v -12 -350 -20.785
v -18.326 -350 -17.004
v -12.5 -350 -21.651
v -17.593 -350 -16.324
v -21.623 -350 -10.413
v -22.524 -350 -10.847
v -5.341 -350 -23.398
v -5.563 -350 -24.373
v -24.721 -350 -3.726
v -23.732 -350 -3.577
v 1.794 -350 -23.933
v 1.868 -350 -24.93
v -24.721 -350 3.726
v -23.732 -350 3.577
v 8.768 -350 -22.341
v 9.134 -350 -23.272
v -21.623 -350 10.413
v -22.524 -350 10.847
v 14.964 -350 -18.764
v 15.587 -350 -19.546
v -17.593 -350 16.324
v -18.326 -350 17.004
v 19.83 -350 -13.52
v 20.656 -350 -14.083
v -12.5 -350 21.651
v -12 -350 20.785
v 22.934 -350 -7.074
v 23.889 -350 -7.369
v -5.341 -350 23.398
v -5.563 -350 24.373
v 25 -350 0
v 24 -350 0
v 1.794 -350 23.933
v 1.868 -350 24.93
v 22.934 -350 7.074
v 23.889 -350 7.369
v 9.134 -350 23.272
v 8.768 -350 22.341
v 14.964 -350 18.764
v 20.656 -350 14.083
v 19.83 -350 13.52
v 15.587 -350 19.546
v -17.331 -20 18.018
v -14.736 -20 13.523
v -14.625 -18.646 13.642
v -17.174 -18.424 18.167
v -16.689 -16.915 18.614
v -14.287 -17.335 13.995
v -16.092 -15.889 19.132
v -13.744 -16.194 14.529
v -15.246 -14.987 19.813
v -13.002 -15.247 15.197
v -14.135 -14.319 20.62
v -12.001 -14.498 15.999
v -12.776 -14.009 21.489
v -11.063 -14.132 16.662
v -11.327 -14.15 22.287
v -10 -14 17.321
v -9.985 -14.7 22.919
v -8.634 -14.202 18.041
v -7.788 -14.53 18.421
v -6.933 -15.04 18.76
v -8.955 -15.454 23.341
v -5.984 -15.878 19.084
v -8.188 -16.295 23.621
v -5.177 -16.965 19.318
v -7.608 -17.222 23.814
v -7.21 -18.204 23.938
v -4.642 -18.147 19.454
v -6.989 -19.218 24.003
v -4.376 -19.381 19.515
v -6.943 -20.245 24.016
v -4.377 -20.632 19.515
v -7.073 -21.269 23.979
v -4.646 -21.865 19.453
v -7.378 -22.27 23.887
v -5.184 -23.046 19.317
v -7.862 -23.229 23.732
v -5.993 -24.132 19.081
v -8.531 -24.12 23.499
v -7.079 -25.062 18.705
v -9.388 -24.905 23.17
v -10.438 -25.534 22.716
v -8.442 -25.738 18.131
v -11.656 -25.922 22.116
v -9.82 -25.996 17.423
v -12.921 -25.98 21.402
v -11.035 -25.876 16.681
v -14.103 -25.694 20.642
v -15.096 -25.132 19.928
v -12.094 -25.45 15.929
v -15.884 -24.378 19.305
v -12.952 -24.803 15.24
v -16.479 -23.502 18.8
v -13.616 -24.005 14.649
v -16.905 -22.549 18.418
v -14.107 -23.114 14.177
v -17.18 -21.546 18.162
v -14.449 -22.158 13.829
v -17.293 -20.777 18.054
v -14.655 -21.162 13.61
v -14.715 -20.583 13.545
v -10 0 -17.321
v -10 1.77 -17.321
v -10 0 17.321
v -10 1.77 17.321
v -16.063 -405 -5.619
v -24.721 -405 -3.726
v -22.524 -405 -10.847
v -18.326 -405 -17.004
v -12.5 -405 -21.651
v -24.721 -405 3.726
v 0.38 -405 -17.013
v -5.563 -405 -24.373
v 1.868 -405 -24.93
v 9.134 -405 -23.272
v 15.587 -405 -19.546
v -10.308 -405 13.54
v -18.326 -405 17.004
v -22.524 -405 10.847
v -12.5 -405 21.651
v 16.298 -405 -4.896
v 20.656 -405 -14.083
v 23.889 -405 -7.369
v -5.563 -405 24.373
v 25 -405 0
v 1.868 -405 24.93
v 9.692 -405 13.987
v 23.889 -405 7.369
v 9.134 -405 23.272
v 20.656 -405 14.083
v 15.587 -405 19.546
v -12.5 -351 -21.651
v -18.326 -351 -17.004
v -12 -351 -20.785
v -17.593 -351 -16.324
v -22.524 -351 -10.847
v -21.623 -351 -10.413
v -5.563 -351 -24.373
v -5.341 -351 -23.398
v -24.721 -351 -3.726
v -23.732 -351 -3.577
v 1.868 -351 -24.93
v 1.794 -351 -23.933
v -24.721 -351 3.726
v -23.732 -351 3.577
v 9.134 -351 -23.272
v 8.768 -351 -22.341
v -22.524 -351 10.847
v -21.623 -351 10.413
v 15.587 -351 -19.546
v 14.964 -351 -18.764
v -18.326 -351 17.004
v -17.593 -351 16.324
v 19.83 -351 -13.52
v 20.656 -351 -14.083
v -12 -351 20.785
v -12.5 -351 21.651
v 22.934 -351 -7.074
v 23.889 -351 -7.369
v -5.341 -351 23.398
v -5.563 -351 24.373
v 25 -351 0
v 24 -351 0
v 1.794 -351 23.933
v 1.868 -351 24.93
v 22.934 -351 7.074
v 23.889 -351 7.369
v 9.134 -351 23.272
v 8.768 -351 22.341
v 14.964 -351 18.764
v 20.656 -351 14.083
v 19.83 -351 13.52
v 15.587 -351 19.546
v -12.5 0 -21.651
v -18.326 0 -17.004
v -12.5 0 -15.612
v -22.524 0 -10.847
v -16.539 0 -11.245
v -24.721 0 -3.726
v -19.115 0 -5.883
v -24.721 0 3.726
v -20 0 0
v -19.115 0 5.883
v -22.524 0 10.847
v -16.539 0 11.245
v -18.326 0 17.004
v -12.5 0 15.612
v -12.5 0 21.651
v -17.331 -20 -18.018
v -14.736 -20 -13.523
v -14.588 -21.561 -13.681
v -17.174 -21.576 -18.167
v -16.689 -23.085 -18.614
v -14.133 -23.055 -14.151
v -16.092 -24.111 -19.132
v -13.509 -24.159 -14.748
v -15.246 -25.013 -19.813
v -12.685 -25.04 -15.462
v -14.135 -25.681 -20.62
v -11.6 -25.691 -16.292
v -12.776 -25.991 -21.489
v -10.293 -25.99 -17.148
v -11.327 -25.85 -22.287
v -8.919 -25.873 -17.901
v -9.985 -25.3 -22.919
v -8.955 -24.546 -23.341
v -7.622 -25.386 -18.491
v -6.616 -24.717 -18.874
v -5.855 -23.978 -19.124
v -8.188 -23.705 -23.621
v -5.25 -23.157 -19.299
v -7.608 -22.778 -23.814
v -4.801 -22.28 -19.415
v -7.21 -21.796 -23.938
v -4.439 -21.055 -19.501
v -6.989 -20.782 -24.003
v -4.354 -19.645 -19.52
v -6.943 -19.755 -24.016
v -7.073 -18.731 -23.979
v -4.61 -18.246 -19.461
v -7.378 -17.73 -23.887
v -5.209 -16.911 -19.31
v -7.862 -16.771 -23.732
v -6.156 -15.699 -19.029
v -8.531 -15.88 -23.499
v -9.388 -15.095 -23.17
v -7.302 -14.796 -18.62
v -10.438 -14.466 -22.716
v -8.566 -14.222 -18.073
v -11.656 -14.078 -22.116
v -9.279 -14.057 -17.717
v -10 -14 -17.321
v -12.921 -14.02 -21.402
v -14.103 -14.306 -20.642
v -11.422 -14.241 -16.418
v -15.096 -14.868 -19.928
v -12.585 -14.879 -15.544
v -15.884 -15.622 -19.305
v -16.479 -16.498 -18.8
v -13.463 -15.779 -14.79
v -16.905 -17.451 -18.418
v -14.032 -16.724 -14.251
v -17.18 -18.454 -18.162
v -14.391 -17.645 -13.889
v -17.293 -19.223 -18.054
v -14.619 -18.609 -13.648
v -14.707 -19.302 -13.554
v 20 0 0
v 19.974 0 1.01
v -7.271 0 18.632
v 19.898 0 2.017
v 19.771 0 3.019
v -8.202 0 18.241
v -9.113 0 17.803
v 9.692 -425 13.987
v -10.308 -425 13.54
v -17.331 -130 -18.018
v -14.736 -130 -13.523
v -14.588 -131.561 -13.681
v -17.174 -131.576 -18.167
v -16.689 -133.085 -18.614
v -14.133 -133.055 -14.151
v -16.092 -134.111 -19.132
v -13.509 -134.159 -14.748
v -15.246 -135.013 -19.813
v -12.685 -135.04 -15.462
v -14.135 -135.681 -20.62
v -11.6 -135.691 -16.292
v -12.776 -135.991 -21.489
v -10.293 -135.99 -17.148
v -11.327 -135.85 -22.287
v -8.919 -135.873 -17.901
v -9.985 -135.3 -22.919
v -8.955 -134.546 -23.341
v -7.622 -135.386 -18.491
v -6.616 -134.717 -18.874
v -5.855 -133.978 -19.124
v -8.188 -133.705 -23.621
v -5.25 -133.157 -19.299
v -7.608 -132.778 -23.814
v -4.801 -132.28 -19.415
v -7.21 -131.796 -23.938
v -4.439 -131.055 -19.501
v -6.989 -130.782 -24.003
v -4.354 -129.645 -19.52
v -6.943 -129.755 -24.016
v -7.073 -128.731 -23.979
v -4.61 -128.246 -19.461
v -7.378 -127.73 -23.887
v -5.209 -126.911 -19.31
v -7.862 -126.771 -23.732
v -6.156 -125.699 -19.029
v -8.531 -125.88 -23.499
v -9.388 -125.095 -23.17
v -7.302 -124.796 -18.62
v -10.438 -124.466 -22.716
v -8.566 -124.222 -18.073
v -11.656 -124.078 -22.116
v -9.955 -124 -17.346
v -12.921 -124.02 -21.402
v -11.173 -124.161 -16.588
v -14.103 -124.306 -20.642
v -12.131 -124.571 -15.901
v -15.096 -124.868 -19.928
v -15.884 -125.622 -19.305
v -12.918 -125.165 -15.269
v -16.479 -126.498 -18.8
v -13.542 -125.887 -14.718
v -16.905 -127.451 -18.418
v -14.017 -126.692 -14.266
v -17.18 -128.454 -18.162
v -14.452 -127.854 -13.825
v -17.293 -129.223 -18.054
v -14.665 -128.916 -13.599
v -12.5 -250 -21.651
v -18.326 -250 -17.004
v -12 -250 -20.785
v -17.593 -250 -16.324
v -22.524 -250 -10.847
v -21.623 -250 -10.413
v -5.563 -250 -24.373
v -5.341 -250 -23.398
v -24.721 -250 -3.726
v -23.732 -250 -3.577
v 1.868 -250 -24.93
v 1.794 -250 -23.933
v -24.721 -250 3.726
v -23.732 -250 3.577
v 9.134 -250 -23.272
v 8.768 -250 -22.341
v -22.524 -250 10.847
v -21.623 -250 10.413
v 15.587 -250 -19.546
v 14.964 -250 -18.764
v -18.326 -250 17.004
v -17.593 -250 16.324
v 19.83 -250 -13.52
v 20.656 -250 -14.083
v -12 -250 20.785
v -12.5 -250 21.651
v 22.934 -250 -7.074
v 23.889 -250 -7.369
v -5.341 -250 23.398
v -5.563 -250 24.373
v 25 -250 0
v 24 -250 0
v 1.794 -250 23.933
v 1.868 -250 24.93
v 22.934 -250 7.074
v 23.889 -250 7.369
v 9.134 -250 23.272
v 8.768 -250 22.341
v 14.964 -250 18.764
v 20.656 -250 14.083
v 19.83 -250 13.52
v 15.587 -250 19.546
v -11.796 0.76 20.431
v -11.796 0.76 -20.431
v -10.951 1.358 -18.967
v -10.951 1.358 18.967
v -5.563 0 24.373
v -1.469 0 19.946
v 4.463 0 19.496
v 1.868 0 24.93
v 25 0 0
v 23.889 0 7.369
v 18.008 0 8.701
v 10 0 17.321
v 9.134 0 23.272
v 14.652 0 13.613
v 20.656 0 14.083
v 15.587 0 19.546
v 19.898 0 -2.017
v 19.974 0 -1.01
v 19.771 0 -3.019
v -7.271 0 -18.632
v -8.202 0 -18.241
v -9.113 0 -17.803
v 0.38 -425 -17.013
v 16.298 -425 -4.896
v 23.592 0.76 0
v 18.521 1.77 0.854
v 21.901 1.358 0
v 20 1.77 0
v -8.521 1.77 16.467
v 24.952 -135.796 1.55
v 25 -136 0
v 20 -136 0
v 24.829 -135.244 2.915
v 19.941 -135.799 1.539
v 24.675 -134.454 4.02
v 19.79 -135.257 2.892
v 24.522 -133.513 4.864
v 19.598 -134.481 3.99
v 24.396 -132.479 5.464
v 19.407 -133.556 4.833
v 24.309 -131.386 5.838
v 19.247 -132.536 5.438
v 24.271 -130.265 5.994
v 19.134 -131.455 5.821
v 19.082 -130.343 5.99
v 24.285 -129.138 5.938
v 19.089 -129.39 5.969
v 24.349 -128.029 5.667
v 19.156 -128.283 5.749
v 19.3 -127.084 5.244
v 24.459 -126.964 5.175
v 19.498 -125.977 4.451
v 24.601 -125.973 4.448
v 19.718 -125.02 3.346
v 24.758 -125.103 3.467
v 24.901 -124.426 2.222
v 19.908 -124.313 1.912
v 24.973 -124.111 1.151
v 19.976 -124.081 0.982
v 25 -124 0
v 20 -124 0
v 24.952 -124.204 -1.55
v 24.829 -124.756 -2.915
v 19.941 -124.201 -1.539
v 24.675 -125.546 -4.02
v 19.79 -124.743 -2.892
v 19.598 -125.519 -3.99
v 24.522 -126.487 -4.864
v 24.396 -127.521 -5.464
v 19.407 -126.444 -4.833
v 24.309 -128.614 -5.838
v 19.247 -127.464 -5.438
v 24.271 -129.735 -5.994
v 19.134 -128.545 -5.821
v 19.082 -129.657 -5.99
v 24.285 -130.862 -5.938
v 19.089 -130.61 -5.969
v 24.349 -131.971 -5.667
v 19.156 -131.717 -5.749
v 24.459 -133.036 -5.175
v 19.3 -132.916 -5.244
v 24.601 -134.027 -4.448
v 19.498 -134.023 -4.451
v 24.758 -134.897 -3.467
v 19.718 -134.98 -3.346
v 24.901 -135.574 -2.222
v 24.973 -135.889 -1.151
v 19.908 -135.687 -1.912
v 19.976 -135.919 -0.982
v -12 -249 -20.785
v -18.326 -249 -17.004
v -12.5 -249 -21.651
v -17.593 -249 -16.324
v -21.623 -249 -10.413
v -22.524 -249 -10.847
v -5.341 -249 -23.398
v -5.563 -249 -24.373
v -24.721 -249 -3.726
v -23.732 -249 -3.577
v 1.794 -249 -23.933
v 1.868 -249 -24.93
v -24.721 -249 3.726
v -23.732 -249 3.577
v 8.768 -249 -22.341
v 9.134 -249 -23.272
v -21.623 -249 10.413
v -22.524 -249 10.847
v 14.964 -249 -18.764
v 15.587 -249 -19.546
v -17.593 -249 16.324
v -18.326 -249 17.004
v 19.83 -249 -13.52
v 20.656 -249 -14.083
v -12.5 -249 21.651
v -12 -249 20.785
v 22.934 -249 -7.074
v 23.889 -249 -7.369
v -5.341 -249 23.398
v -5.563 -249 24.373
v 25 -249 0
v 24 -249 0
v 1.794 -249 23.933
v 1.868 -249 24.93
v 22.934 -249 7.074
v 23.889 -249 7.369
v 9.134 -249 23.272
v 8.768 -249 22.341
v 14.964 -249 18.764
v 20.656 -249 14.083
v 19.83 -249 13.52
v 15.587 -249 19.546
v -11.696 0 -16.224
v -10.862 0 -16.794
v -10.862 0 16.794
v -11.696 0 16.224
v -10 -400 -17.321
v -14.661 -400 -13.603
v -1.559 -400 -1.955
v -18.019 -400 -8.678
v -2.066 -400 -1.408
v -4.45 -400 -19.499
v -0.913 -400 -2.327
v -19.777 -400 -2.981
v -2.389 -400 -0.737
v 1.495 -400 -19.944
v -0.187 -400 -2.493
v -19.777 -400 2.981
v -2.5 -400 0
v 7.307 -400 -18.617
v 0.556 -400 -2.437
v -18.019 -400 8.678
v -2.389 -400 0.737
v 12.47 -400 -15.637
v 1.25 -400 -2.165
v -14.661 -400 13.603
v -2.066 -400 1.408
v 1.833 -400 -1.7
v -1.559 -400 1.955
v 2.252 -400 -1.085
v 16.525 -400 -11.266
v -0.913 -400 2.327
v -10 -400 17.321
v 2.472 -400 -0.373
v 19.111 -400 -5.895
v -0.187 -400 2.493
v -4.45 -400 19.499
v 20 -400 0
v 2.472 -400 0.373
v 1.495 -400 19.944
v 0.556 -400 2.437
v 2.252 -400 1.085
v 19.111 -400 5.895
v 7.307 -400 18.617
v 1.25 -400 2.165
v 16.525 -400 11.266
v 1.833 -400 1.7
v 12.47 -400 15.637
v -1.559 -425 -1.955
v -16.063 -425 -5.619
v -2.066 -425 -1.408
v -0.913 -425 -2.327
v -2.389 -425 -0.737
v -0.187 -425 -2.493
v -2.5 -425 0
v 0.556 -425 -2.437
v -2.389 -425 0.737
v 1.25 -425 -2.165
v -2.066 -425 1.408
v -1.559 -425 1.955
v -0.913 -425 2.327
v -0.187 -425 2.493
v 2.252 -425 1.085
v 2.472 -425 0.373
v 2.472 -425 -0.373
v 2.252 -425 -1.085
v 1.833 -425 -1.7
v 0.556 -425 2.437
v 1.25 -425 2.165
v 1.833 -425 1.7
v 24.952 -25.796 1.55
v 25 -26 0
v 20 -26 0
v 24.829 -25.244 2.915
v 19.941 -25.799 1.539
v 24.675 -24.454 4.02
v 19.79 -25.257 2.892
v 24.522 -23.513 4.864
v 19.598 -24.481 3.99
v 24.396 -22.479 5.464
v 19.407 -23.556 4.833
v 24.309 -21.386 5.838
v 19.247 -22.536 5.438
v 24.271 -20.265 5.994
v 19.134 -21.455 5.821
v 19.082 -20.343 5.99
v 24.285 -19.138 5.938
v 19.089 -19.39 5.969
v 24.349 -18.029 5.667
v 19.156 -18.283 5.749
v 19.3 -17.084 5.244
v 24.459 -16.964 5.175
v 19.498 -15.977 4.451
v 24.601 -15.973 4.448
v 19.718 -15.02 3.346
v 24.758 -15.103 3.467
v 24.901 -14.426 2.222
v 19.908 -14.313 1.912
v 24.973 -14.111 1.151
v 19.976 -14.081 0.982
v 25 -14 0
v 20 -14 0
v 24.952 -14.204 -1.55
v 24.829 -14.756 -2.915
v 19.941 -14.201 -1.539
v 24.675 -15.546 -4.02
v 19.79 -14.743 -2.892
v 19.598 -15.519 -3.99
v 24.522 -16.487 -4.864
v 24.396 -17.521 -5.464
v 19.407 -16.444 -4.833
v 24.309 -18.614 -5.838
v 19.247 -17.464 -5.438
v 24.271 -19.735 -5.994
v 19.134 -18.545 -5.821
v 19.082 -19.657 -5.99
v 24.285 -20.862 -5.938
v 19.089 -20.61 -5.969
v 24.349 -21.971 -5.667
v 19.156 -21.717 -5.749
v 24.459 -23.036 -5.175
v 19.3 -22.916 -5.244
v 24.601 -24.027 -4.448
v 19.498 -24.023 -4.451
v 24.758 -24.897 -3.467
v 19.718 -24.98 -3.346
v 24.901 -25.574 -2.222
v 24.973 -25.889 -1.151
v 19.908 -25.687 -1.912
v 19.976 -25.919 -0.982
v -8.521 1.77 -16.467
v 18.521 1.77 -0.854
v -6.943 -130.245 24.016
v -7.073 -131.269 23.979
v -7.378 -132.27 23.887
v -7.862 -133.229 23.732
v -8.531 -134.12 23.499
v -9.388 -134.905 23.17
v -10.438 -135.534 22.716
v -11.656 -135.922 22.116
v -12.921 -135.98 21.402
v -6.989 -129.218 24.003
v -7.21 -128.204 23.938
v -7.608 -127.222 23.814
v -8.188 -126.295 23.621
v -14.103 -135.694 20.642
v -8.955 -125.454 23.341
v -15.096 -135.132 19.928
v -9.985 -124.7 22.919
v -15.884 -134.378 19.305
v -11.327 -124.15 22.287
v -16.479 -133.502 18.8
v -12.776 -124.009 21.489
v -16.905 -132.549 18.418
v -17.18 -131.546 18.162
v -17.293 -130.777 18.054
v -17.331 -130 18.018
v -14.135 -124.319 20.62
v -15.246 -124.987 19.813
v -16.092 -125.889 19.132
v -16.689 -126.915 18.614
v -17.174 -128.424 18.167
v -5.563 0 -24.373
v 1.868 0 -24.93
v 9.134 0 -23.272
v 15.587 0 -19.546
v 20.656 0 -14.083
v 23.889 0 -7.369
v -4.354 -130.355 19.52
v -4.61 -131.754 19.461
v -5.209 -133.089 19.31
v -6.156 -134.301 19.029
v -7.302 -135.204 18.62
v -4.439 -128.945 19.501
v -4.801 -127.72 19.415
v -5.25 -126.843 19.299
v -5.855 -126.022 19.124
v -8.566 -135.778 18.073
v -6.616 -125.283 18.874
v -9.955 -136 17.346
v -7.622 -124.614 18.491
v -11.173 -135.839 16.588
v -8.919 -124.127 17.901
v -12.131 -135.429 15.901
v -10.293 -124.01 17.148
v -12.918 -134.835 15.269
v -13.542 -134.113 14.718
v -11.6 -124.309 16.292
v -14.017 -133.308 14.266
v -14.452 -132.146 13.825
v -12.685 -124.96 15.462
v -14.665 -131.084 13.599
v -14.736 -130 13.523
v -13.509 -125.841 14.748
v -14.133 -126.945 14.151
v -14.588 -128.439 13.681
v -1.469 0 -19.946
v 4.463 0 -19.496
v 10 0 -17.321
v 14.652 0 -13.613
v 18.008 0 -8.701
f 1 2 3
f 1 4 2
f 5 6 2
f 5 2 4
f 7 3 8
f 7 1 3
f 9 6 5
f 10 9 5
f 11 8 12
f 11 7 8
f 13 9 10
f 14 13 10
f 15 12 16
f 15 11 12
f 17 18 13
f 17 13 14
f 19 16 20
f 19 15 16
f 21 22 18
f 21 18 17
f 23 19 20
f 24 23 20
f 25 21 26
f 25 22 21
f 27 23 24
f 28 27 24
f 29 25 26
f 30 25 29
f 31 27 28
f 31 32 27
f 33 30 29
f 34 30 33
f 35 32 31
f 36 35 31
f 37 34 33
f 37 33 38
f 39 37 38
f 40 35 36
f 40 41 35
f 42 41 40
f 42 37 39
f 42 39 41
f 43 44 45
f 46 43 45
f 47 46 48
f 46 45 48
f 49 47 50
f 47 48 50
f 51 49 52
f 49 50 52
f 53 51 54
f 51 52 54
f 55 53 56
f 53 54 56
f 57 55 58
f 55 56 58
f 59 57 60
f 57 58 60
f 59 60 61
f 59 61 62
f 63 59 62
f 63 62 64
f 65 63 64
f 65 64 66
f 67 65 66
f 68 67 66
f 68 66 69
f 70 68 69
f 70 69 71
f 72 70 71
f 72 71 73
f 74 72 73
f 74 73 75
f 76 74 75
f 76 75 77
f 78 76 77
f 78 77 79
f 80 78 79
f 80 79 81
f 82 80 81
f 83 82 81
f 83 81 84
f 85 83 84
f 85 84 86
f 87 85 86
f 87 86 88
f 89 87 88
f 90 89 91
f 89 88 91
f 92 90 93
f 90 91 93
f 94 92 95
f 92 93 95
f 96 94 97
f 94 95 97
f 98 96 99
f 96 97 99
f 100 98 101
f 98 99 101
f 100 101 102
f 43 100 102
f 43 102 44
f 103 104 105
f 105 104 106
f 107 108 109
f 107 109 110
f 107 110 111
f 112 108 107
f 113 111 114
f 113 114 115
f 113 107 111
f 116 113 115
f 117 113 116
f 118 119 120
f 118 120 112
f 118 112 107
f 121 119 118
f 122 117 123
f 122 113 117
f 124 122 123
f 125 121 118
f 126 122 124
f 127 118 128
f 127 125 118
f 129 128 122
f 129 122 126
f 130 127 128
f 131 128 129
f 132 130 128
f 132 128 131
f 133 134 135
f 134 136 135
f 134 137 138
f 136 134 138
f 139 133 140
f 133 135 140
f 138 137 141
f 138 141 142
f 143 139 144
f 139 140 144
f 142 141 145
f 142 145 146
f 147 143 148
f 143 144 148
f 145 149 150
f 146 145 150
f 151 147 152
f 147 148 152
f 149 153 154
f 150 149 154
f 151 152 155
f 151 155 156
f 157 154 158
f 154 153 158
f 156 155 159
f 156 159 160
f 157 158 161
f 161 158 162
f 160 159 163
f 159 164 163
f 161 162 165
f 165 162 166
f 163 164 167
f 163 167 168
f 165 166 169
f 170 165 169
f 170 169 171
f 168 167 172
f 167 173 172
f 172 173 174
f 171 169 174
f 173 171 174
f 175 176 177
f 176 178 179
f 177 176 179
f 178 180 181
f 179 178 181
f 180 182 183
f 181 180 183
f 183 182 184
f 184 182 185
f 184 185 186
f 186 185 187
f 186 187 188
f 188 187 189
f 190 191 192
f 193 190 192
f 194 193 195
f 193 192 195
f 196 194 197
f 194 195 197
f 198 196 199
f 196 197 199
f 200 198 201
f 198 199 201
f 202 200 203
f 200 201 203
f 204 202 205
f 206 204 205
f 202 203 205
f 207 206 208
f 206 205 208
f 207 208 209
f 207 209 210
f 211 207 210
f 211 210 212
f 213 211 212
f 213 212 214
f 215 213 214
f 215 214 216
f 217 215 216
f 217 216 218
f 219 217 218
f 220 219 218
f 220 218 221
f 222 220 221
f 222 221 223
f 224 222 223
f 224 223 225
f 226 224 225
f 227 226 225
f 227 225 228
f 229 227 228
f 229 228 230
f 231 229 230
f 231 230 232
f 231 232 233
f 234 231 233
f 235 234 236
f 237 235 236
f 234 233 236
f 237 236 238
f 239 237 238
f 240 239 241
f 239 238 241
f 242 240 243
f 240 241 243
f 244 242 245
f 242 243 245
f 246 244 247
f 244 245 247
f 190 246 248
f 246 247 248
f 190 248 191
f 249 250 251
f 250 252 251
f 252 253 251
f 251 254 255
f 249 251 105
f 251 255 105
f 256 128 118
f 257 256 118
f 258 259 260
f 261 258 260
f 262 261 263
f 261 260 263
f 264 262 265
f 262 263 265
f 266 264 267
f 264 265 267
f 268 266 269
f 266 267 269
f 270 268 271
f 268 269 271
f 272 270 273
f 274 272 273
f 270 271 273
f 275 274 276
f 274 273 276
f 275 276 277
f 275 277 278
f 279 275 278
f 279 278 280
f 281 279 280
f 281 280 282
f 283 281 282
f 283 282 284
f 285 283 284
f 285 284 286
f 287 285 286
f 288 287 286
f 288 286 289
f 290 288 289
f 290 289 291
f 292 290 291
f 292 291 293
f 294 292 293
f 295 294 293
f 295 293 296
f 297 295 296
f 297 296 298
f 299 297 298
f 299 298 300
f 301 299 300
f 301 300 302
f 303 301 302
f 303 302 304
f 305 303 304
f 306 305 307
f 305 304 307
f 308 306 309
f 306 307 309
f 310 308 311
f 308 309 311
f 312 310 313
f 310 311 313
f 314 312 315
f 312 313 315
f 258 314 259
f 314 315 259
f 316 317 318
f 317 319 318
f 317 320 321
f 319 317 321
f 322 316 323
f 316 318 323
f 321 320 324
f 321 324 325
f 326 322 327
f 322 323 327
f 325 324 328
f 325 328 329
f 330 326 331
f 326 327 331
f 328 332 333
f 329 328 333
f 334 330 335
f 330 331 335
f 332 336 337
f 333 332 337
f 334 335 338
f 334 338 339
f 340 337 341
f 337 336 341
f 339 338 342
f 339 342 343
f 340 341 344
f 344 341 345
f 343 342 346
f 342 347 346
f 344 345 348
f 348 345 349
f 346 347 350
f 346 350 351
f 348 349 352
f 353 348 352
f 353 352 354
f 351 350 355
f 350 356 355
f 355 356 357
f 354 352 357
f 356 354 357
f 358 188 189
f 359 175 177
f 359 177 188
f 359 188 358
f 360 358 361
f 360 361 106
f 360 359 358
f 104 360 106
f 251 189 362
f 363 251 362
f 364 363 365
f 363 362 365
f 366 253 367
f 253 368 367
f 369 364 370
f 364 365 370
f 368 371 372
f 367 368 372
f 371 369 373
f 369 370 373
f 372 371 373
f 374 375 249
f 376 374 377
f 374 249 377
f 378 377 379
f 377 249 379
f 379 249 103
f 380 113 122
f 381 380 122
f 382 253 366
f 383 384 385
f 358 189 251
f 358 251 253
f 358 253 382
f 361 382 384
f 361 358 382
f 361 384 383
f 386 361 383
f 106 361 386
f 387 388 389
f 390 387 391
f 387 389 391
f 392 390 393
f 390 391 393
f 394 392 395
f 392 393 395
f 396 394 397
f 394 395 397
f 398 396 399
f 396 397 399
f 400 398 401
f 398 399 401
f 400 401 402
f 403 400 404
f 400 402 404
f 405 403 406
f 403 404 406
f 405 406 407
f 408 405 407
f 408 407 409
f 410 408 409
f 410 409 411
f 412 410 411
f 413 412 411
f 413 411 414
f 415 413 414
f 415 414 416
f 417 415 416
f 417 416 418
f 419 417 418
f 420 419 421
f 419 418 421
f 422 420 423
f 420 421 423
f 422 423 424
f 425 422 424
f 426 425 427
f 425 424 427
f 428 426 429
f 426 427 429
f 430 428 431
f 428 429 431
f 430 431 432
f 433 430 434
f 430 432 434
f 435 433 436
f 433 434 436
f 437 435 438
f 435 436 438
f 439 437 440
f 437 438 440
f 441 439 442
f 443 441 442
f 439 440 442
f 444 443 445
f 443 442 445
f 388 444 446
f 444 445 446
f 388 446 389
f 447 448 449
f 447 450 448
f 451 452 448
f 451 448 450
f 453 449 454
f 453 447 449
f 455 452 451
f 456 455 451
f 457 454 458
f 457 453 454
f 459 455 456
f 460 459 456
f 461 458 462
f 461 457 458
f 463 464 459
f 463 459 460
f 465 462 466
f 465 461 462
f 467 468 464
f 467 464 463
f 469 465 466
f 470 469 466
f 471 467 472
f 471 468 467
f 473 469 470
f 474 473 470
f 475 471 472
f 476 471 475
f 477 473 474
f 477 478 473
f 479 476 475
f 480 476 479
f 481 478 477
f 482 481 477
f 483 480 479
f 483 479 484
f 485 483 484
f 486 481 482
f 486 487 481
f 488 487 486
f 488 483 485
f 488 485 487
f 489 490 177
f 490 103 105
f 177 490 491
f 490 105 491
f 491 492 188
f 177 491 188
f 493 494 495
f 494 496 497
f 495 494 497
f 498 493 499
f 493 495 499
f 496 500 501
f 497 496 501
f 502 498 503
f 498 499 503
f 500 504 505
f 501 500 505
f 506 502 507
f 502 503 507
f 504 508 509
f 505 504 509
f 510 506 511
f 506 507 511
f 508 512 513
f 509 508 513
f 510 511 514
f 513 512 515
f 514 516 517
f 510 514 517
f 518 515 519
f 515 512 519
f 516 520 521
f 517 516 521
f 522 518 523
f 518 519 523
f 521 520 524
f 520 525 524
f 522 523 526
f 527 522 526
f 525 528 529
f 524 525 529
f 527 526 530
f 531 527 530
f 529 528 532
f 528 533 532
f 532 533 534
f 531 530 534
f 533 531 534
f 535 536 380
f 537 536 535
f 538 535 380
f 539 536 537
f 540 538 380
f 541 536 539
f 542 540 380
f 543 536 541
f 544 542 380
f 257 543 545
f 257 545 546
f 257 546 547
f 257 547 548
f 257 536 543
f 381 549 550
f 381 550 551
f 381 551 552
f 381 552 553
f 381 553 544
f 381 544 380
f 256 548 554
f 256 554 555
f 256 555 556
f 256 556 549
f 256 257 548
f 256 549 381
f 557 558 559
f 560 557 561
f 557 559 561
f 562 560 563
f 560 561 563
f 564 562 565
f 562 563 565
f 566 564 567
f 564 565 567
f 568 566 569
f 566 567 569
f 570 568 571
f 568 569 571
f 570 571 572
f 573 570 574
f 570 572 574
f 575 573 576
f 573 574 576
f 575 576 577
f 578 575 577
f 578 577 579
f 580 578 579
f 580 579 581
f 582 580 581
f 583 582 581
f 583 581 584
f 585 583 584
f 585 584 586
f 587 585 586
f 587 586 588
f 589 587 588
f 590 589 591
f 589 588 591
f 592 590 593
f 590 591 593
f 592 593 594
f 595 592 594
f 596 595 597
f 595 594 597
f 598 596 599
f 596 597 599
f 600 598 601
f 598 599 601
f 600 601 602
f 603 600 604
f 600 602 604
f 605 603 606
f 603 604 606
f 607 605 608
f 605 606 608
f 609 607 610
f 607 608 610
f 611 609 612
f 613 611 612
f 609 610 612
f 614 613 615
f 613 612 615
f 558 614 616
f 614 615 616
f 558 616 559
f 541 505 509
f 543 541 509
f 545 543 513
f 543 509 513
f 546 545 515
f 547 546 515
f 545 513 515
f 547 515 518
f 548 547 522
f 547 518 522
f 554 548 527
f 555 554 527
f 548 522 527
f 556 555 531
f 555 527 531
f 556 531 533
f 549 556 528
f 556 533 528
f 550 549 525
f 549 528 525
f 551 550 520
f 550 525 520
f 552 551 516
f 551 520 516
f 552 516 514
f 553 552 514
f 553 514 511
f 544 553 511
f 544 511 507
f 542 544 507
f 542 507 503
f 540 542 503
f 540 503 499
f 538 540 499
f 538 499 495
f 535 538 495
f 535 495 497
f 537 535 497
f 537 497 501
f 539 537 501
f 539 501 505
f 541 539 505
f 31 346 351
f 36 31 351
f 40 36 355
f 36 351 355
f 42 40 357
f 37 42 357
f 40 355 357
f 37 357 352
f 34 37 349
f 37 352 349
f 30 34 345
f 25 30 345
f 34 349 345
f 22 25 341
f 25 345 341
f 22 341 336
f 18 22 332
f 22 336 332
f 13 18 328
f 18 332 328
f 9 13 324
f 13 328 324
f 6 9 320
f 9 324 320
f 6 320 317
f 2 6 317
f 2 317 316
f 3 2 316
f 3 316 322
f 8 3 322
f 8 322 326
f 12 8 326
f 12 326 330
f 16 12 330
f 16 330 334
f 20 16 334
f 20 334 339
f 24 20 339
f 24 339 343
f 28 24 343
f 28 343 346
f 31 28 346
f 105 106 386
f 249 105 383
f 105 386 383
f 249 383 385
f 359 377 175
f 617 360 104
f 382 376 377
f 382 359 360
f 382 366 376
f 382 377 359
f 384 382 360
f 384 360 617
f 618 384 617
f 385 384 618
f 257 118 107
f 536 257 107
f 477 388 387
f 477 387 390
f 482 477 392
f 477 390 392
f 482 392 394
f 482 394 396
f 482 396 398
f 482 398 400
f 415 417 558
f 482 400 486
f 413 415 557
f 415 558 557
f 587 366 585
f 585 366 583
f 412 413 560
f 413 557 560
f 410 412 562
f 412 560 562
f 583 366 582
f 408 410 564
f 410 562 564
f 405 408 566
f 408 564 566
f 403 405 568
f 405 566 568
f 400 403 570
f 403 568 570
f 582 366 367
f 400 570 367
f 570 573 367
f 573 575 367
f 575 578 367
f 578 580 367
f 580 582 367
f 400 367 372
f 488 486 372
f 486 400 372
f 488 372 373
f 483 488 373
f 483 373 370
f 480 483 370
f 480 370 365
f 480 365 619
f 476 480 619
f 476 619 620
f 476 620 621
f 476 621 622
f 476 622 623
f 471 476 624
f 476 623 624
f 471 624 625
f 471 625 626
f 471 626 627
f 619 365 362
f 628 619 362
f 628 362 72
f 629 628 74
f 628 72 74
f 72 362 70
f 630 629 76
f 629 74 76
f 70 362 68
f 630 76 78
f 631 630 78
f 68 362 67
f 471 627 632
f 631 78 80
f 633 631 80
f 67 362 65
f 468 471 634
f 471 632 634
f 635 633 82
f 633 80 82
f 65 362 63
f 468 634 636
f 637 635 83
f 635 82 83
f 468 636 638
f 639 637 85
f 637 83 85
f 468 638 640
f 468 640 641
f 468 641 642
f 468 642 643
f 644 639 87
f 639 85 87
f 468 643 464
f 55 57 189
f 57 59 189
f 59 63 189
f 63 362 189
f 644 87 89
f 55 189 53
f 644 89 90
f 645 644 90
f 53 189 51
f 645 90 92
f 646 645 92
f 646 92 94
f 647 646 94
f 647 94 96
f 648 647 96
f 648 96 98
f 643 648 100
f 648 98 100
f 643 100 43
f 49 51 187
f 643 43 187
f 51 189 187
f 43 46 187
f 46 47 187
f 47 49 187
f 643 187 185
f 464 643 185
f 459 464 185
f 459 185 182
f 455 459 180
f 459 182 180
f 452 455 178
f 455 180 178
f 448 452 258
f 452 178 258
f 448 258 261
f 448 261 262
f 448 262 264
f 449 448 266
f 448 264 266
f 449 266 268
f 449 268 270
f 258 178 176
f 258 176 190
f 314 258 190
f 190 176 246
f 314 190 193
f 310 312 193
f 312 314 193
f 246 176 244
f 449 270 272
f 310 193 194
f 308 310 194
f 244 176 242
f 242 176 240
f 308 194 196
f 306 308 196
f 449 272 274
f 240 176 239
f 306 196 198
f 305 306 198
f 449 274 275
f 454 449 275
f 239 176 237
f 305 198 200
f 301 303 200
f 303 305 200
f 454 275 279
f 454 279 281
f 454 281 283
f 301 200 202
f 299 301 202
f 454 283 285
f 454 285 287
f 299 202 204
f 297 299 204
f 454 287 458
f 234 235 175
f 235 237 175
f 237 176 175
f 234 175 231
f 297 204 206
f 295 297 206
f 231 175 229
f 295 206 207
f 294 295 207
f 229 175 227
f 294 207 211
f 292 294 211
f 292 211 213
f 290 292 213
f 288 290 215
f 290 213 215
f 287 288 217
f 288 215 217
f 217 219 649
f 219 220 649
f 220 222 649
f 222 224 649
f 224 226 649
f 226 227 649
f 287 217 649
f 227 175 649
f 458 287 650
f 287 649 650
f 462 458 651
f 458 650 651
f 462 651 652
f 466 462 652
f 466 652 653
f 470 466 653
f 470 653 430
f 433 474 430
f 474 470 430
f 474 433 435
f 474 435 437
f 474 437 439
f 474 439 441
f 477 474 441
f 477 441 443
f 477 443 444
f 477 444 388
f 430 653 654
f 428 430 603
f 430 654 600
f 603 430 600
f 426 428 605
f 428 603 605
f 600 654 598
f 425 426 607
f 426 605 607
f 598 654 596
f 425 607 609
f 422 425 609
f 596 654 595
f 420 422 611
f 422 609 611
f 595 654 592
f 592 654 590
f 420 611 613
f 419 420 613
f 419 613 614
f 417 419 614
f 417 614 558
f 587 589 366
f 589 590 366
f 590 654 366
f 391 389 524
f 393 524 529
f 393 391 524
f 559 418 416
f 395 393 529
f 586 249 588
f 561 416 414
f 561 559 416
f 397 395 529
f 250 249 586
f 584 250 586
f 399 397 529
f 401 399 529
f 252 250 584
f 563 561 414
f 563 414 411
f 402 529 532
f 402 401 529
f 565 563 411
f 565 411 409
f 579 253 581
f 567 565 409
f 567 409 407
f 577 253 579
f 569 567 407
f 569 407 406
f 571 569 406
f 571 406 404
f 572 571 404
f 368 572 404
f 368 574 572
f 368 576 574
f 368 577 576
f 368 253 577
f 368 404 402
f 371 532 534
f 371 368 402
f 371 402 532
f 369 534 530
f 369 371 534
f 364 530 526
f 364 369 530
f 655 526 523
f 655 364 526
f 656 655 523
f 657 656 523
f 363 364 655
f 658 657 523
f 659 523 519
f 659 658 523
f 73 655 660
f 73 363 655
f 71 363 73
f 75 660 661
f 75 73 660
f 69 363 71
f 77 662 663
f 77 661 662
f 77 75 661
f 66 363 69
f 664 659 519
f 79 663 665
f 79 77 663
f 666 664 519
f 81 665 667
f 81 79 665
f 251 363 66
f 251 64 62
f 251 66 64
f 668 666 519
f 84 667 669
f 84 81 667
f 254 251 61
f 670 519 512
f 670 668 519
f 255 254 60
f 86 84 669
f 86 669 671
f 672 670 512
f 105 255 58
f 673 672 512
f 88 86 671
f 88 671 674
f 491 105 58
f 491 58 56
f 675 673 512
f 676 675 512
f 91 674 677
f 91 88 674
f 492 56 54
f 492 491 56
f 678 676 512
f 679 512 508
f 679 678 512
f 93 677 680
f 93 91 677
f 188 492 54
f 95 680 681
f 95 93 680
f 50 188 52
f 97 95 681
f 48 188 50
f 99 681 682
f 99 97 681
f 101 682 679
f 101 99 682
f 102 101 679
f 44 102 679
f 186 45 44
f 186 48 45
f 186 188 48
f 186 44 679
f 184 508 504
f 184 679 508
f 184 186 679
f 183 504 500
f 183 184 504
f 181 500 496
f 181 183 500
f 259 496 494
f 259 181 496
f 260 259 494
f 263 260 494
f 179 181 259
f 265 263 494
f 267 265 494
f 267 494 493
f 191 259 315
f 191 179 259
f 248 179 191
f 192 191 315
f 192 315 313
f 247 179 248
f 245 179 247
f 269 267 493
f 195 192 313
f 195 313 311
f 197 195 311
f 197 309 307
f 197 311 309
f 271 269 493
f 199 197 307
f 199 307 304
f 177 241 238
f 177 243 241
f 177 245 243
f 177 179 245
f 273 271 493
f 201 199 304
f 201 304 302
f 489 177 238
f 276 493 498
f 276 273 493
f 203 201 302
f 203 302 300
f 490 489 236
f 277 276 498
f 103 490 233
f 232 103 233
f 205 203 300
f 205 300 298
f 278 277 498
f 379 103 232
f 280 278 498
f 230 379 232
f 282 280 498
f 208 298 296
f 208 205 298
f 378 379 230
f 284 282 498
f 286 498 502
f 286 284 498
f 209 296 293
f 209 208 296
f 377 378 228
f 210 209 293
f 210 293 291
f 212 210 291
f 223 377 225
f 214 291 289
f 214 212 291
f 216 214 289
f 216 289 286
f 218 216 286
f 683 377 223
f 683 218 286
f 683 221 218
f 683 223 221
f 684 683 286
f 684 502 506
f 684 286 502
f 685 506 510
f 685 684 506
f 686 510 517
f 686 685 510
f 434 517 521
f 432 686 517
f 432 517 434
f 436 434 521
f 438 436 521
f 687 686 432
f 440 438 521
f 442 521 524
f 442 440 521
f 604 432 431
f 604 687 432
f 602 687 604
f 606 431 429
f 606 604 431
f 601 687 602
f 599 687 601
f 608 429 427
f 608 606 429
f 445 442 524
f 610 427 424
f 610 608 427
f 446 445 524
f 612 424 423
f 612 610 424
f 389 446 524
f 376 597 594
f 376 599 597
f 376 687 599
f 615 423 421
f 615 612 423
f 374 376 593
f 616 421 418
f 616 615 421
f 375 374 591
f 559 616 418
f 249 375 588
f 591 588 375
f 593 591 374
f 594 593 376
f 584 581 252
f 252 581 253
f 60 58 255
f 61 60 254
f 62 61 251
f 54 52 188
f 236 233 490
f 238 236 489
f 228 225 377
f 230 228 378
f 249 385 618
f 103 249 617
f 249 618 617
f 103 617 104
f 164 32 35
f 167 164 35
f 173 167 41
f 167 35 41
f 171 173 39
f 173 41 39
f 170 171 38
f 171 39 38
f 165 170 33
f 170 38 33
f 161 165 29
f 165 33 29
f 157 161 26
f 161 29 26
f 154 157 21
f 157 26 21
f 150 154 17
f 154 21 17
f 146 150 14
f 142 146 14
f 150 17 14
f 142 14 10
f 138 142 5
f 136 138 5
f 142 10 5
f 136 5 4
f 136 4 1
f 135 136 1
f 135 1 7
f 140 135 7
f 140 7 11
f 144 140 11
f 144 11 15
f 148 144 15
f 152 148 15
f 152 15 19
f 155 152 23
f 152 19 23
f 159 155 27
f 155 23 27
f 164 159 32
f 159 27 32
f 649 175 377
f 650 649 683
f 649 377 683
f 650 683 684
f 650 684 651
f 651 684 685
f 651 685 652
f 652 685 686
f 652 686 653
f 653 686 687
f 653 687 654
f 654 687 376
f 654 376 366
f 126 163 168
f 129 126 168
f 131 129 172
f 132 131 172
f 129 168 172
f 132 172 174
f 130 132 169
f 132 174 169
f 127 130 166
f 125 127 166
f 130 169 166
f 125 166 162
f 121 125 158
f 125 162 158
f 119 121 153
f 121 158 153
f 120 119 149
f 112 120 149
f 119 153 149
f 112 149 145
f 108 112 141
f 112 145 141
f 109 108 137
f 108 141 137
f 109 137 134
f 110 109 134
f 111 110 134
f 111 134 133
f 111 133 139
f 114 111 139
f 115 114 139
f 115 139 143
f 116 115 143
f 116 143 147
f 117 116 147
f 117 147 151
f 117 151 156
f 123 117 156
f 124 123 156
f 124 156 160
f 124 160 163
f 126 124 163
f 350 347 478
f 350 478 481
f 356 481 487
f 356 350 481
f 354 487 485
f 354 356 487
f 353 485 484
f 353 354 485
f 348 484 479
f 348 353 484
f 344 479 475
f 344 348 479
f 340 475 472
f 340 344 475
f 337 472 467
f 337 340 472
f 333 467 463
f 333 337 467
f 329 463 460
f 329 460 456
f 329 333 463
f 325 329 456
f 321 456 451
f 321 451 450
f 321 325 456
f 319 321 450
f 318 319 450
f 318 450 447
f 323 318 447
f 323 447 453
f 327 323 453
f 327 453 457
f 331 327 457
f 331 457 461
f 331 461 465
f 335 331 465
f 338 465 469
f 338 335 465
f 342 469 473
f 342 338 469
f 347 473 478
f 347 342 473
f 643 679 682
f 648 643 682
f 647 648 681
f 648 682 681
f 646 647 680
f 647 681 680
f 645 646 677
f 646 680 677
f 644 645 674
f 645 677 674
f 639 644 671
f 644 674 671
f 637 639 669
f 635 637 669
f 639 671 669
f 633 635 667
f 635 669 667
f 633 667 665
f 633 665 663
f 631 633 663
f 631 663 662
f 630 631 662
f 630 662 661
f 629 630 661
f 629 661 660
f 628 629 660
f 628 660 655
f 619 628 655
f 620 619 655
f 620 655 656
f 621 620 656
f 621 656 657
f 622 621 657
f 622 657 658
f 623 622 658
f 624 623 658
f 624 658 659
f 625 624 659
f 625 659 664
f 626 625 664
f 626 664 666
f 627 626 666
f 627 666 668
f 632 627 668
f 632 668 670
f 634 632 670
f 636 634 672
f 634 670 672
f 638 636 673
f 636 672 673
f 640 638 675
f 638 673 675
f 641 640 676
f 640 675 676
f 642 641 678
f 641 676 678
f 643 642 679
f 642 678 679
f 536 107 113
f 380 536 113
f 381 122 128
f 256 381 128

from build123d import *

# Parameters (mm, degrees)
F0_R          = 25
F0_R_2        = 20
F1_DEPTH      = 400
F2_R          = 25
F3_DEPTH      = 5
F5_DEPTH      = 20
F7_D          = 5
F10_D         = 12
F10_DEPTH     = 6
F10_START     = 0.7306779
F10_TIP       = 3.6051637142
F12_DEPTH     = 2
F17_D         = 12
F17_DEPTH     = 6
F17_START     = 0.7306779
F17_TIP       = 3.6051637142
F19_D         = 12
F19_DEPTH     = 6
F19_START     = 0.7306779
F19_TIP       = 3.6051637142
F21_R         = 25
F21_R_2       = 24
F22_DEPTH     = 1
F24_R         = 25
F24_R_2       = 24
F25_DEPTH     = 1
F27_DEPTH     = 20
F28_T1_DEPTH  = 16.0381401647
F28_T3_DEPTH  = 31.2249898061
F28_T5_DEPTH  = 16.0381402184
F28_T7_DEPTH  = 16.0381401647
F28_T9_DEPTH  = 31.2249898061
F28_T11_DEPTH = 16.0381402184
F28_T13_DEPTH = 16.0381401647
F28_T15_DEPTH = 31.2249898061
F28_T17_DEPTH = 16.0381402184


# Not quite as in the source:
# - a fillet or chamfer that OpenCascade refuses, or shapes differently, is made with other operations: its cross-section is extruded or revolved along the edge and cut away or added


with BuildPart() as f1:
    # F0 (on Front) → F1 (new body)
    with BuildSketch(Plane.XZ):
        Circle(F0_R)
        Circle(F0_R_2, mode=Mode.SUBTRACT)
    extrude(amount=F1_DEPTH)

    # F2 (on face) → F3 (join)
    with BuildSketch(Plane.XZ.offset(400)):
        Circle(F2_R)
    extrude(amount=F3_DEPTH)

    # F4 (on face) → F5 (join)
    with BuildSketch(Plane.XZ.offset(405)):
        Polygon((-16.0628025015, -5.6190539991), (0.380358971, -17.013016167), (16.2978772735, -4.8955682433), (9.6922831285, 13.9873885984), (-10.3077168715, 13.540249811), align=None)
    extrude(amount=F5_DEPTH)

    # F7 (through all)
    with Locations(Plane.XZ.offset(425)):
        with Locations((0, 0)):
            Hole(F7_D / 2)

    # F10
    # its depths count from where the whole tool has entered the part; down to there all is cleared
    with Locations(Plane.YZ.offset(25).offset(-F10_START)):
        with Locations((-20, 0), (-130, 0)):
            Hole(F10_D / 2, depth=F10_DEPTH)
            with Locations((0, 0, -(F10_DEPTH + F10_TIP / 2))):  # 118° drill point
                Cone(0, F10_D / 2, F10_TIP, mode=Mode.SUBTRACT)

    # F11 (on face) → F12 (join)
    with BuildSketch(Plane(origin=(0, 0, 0), x_dir=(-1, 0, 0), z_dir=(0, 1, 0))):
        Polygon((12.5, -21.6506350946), (12.5, 21.6506350946), (-25, 0), align=None)
    extrude(amount=F12_DEPTH)

    # F17
    # its depths count from where the whole tool has entered the part; down to there all is cleared
    with Locations(Plane(origin=(-12.5, 0, -21.6506350946), x_dir=(0.8660254038, 0, -0.5), z_dir=(-0.5, 0, -0.8660254038)).offset(-F17_START)):
        with Locations((0, 20), (0, 130)):
            Hole(F17_D / 2, depth=F17_DEPTH)
            with Locations((0, 0, -(F17_DEPTH + F17_TIP / 2))):  # 118° drill point
                Cone(0, F17_D / 2, F17_TIP, mode=Mode.SUBTRACT)

    # F19
    # its depths count from where the whole tool has entered the part; down to there all is cleared
    with Locations(Plane(origin=(-12.5, 0, 21.6506350946), x_dir=(0.8660254038, 0, 0.5), z_dir=(-0.5, 0, 0.8660254038)).offset(-F19_START)):
        with Locations((0, -20), (0, -130)):
            Hole(F19_D / 2, depth=F19_DEPTH)
            with Locations((0, 0, -(F19_DEPTH + F19_TIP / 2))):  # 118° drill point
                Cone(0, F19_D / 2, F19_TIP, mode=Mode.SUBTRACT)

    # F21 (on offset) → F22 (cut)
    with BuildSketch(Plane.XZ.offset(250)):
        Circle(F21_R)
        Circle(F21_R_2, mode=Mode.SUBTRACT)
    extrude(amount=-F22_DEPTH, mode=Mode.SUBTRACT)

    # F24 (on offset) → F25 (cut)
    with BuildSketch(Plane.XZ.offset(350)):
        Circle(F24_R)
        Circle(F24_R_2, mode=Mode.SUBTRACT)
    extrude(amount=F25_DEPTH, mode=Mode.SUBTRACT)

    # F26 (on face) → F27 (cut)
    with BuildSketch(Plane(origin=(0, 2, 0), x_dir=(-1, 0, 0), z_dir=(0, 1, 0))):
        Polygon((-20, 0), (10, -17.3205080757), (10, 17.3205080757), align=None)
    extrude(amount=-F27_DEPTH, mode=Mode.SUBTRACT)

    # F28: fillet of radius 5 on 3 edges, made by hand

    # F28_s2 → F28_t1 (cut)
    with BuildSketch(Plane(origin=(27.4102540378, 0, 15.8253175473), x_dir=(0, 1, 0), z_dir=(-0.8660254038, 0, -0.5))):
        with BuildLine():
            ThreePointArc((0, 12.5), (1.472135955, 10.7360679775), (2, 8.5))
            Line((2, 8.5), (2, 12.5))
            Line((2, 12.5), (0, 12.5))
        make_face()
    extrude(amount=F28_T1_DEPTH, mode=Mode.SUBTRACT)

    # F28_s4 → F28_t3 (cut)
    with BuildSketch(Plane(origin=(13.5208172258, 0, 7.806247465), x_dir=(0, 1, 0), z_dir=(-0.8660254038, 0, -0.5))):
        with BuildLine():
            ThreePointArc((0, 12.5), (1.472135955, 10.7360679775), (2, 8.5))
            Line((2, 8.5), (2, 12.5))
            Line((2, 12.5), (0, 12.5))
        make_face()
    extrude(amount=F28_T3_DEPTH, mode=Mode.SUBTRACT)

    # F28_s6 → F28_t5 (cut)
    with BuildSketch(Plane(origin=(-13.5208171792, 0, -7.8062474381), x_dir=(0, 1, 0), z_dir=(-0.8660254038, 0, -0.5))):
        with BuildLine():
            ThreePointArc((0, 12.5), (1.472135955, 10.7360679775), (2, 8.5))
            Line((2, 8.5), (2, 12.5))
            Line((2, 12.5), (0, 12.5))
        make_face()
    extrude(amount=F28_T5_DEPTH, mode=Mode.SUBTRACT)

    # F28_s8 → F28_t7 (cut)
    with BuildSketch(Plane.XY.offset(-31.6506350946)):
        with BuildLine():
            ThreePointArc((-12.5, 0), (-10.7360679775, 1.472135955), (-8.5, 2))
            Line((-8.5, 2), (-12.5, 2))
            Line((-12.5, 2), (-12.5, 0))
        make_face()
    extrude(amount=F28_T7_DEPTH, mode=Mode.SUBTRACT)

    # F28_s10 → F28_t9 (cut)
    with BuildSketch(Plane.XY.offset(-15.61249493)):
        with BuildLine():
            ThreePointArc((-12.5, 0), (-10.7360679775, 1.472135955), (-8.5, 2))
            Line((-8.5, 2), (-12.5, 2))
            Line((-12.5, 2), (-12.5, 0))
        make_face()
    extrude(amount=F28_T9_DEPTH, mode=Mode.SUBTRACT)

    # F28_s12 → F28_t11 (cut)
    with BuildSketch(Plane.XY.offset(15.6124948762)):
        with BuildLine():
            ThreePointArc((-12.5, 0), (-10.7360679775, 1.472135955), (-8.5, 2))
            Line((-8.5, 2), (-12.5, 2))
            Line((-12.5, 2), (-12.5, 0))
        make_face()
    extrude(amount=F28_T11_DEPTH, mode=Mode.SUBTRACT)

    # F28_s14 → F28_t13 (cut)
    with BuildSketch(Plane(origin=(-27.4102540378, 0, 15.8253175473), x_dir=(0, 1, 0), z_dir=(0.8660254038, 0, -0.5))):
        with BuildLine():
            ThreePointArc((0, 12.5), (1.472135955, 10.7360679775), (2, 8.5))
            Line((2, 8.5), (2, 12.5))
            Line((2, 12.5), (0, 12.5))
        make_face()
    extrude(amount=F28_T13_DEPTH, mode=Mode.SUBTRACT)

    # F28_s16 → F28_t15 (cut)
    with BuildSketch(Plane(origin=(-13.5208172258, 0, 7.806247465), x_dir=(0, 1, 0), z_dir=(0.8660254038, 0, -0.5))):
        with BuildLine():
            ThreePointArc((0, 12.5), (1.472135955, 10.7360679775), (2, 8.5))
            Line((2, 8.5), (2, 12.5))
            Line((2, 12.5), (0, 12.5))
        make_face()
    extrude(amount=F28_T15_DEPTH, mode=Mode.SUBTRACT)

    # F28_s18 → F28_t17 (cut)
    with BuildSketch(Plane(origin=(13.5208171792, 0, -7.8062474381), x_dir=(0, 1, 0), z_dir=(0.8660254038, 0, -0.5))):
        with BuildLine():
            ThreePointArc((0, 12.5), (1.472135955, 10.7360679775), (2, 8.5))
            Line((2, 8.5), (2, 12.5))
            Line((2, 12.5), (0, 12.5))
        make_face()
    extrude(amount=F28_T17_DEPTH, mode=Mode.SUBTRACT)


solid = f1.part
